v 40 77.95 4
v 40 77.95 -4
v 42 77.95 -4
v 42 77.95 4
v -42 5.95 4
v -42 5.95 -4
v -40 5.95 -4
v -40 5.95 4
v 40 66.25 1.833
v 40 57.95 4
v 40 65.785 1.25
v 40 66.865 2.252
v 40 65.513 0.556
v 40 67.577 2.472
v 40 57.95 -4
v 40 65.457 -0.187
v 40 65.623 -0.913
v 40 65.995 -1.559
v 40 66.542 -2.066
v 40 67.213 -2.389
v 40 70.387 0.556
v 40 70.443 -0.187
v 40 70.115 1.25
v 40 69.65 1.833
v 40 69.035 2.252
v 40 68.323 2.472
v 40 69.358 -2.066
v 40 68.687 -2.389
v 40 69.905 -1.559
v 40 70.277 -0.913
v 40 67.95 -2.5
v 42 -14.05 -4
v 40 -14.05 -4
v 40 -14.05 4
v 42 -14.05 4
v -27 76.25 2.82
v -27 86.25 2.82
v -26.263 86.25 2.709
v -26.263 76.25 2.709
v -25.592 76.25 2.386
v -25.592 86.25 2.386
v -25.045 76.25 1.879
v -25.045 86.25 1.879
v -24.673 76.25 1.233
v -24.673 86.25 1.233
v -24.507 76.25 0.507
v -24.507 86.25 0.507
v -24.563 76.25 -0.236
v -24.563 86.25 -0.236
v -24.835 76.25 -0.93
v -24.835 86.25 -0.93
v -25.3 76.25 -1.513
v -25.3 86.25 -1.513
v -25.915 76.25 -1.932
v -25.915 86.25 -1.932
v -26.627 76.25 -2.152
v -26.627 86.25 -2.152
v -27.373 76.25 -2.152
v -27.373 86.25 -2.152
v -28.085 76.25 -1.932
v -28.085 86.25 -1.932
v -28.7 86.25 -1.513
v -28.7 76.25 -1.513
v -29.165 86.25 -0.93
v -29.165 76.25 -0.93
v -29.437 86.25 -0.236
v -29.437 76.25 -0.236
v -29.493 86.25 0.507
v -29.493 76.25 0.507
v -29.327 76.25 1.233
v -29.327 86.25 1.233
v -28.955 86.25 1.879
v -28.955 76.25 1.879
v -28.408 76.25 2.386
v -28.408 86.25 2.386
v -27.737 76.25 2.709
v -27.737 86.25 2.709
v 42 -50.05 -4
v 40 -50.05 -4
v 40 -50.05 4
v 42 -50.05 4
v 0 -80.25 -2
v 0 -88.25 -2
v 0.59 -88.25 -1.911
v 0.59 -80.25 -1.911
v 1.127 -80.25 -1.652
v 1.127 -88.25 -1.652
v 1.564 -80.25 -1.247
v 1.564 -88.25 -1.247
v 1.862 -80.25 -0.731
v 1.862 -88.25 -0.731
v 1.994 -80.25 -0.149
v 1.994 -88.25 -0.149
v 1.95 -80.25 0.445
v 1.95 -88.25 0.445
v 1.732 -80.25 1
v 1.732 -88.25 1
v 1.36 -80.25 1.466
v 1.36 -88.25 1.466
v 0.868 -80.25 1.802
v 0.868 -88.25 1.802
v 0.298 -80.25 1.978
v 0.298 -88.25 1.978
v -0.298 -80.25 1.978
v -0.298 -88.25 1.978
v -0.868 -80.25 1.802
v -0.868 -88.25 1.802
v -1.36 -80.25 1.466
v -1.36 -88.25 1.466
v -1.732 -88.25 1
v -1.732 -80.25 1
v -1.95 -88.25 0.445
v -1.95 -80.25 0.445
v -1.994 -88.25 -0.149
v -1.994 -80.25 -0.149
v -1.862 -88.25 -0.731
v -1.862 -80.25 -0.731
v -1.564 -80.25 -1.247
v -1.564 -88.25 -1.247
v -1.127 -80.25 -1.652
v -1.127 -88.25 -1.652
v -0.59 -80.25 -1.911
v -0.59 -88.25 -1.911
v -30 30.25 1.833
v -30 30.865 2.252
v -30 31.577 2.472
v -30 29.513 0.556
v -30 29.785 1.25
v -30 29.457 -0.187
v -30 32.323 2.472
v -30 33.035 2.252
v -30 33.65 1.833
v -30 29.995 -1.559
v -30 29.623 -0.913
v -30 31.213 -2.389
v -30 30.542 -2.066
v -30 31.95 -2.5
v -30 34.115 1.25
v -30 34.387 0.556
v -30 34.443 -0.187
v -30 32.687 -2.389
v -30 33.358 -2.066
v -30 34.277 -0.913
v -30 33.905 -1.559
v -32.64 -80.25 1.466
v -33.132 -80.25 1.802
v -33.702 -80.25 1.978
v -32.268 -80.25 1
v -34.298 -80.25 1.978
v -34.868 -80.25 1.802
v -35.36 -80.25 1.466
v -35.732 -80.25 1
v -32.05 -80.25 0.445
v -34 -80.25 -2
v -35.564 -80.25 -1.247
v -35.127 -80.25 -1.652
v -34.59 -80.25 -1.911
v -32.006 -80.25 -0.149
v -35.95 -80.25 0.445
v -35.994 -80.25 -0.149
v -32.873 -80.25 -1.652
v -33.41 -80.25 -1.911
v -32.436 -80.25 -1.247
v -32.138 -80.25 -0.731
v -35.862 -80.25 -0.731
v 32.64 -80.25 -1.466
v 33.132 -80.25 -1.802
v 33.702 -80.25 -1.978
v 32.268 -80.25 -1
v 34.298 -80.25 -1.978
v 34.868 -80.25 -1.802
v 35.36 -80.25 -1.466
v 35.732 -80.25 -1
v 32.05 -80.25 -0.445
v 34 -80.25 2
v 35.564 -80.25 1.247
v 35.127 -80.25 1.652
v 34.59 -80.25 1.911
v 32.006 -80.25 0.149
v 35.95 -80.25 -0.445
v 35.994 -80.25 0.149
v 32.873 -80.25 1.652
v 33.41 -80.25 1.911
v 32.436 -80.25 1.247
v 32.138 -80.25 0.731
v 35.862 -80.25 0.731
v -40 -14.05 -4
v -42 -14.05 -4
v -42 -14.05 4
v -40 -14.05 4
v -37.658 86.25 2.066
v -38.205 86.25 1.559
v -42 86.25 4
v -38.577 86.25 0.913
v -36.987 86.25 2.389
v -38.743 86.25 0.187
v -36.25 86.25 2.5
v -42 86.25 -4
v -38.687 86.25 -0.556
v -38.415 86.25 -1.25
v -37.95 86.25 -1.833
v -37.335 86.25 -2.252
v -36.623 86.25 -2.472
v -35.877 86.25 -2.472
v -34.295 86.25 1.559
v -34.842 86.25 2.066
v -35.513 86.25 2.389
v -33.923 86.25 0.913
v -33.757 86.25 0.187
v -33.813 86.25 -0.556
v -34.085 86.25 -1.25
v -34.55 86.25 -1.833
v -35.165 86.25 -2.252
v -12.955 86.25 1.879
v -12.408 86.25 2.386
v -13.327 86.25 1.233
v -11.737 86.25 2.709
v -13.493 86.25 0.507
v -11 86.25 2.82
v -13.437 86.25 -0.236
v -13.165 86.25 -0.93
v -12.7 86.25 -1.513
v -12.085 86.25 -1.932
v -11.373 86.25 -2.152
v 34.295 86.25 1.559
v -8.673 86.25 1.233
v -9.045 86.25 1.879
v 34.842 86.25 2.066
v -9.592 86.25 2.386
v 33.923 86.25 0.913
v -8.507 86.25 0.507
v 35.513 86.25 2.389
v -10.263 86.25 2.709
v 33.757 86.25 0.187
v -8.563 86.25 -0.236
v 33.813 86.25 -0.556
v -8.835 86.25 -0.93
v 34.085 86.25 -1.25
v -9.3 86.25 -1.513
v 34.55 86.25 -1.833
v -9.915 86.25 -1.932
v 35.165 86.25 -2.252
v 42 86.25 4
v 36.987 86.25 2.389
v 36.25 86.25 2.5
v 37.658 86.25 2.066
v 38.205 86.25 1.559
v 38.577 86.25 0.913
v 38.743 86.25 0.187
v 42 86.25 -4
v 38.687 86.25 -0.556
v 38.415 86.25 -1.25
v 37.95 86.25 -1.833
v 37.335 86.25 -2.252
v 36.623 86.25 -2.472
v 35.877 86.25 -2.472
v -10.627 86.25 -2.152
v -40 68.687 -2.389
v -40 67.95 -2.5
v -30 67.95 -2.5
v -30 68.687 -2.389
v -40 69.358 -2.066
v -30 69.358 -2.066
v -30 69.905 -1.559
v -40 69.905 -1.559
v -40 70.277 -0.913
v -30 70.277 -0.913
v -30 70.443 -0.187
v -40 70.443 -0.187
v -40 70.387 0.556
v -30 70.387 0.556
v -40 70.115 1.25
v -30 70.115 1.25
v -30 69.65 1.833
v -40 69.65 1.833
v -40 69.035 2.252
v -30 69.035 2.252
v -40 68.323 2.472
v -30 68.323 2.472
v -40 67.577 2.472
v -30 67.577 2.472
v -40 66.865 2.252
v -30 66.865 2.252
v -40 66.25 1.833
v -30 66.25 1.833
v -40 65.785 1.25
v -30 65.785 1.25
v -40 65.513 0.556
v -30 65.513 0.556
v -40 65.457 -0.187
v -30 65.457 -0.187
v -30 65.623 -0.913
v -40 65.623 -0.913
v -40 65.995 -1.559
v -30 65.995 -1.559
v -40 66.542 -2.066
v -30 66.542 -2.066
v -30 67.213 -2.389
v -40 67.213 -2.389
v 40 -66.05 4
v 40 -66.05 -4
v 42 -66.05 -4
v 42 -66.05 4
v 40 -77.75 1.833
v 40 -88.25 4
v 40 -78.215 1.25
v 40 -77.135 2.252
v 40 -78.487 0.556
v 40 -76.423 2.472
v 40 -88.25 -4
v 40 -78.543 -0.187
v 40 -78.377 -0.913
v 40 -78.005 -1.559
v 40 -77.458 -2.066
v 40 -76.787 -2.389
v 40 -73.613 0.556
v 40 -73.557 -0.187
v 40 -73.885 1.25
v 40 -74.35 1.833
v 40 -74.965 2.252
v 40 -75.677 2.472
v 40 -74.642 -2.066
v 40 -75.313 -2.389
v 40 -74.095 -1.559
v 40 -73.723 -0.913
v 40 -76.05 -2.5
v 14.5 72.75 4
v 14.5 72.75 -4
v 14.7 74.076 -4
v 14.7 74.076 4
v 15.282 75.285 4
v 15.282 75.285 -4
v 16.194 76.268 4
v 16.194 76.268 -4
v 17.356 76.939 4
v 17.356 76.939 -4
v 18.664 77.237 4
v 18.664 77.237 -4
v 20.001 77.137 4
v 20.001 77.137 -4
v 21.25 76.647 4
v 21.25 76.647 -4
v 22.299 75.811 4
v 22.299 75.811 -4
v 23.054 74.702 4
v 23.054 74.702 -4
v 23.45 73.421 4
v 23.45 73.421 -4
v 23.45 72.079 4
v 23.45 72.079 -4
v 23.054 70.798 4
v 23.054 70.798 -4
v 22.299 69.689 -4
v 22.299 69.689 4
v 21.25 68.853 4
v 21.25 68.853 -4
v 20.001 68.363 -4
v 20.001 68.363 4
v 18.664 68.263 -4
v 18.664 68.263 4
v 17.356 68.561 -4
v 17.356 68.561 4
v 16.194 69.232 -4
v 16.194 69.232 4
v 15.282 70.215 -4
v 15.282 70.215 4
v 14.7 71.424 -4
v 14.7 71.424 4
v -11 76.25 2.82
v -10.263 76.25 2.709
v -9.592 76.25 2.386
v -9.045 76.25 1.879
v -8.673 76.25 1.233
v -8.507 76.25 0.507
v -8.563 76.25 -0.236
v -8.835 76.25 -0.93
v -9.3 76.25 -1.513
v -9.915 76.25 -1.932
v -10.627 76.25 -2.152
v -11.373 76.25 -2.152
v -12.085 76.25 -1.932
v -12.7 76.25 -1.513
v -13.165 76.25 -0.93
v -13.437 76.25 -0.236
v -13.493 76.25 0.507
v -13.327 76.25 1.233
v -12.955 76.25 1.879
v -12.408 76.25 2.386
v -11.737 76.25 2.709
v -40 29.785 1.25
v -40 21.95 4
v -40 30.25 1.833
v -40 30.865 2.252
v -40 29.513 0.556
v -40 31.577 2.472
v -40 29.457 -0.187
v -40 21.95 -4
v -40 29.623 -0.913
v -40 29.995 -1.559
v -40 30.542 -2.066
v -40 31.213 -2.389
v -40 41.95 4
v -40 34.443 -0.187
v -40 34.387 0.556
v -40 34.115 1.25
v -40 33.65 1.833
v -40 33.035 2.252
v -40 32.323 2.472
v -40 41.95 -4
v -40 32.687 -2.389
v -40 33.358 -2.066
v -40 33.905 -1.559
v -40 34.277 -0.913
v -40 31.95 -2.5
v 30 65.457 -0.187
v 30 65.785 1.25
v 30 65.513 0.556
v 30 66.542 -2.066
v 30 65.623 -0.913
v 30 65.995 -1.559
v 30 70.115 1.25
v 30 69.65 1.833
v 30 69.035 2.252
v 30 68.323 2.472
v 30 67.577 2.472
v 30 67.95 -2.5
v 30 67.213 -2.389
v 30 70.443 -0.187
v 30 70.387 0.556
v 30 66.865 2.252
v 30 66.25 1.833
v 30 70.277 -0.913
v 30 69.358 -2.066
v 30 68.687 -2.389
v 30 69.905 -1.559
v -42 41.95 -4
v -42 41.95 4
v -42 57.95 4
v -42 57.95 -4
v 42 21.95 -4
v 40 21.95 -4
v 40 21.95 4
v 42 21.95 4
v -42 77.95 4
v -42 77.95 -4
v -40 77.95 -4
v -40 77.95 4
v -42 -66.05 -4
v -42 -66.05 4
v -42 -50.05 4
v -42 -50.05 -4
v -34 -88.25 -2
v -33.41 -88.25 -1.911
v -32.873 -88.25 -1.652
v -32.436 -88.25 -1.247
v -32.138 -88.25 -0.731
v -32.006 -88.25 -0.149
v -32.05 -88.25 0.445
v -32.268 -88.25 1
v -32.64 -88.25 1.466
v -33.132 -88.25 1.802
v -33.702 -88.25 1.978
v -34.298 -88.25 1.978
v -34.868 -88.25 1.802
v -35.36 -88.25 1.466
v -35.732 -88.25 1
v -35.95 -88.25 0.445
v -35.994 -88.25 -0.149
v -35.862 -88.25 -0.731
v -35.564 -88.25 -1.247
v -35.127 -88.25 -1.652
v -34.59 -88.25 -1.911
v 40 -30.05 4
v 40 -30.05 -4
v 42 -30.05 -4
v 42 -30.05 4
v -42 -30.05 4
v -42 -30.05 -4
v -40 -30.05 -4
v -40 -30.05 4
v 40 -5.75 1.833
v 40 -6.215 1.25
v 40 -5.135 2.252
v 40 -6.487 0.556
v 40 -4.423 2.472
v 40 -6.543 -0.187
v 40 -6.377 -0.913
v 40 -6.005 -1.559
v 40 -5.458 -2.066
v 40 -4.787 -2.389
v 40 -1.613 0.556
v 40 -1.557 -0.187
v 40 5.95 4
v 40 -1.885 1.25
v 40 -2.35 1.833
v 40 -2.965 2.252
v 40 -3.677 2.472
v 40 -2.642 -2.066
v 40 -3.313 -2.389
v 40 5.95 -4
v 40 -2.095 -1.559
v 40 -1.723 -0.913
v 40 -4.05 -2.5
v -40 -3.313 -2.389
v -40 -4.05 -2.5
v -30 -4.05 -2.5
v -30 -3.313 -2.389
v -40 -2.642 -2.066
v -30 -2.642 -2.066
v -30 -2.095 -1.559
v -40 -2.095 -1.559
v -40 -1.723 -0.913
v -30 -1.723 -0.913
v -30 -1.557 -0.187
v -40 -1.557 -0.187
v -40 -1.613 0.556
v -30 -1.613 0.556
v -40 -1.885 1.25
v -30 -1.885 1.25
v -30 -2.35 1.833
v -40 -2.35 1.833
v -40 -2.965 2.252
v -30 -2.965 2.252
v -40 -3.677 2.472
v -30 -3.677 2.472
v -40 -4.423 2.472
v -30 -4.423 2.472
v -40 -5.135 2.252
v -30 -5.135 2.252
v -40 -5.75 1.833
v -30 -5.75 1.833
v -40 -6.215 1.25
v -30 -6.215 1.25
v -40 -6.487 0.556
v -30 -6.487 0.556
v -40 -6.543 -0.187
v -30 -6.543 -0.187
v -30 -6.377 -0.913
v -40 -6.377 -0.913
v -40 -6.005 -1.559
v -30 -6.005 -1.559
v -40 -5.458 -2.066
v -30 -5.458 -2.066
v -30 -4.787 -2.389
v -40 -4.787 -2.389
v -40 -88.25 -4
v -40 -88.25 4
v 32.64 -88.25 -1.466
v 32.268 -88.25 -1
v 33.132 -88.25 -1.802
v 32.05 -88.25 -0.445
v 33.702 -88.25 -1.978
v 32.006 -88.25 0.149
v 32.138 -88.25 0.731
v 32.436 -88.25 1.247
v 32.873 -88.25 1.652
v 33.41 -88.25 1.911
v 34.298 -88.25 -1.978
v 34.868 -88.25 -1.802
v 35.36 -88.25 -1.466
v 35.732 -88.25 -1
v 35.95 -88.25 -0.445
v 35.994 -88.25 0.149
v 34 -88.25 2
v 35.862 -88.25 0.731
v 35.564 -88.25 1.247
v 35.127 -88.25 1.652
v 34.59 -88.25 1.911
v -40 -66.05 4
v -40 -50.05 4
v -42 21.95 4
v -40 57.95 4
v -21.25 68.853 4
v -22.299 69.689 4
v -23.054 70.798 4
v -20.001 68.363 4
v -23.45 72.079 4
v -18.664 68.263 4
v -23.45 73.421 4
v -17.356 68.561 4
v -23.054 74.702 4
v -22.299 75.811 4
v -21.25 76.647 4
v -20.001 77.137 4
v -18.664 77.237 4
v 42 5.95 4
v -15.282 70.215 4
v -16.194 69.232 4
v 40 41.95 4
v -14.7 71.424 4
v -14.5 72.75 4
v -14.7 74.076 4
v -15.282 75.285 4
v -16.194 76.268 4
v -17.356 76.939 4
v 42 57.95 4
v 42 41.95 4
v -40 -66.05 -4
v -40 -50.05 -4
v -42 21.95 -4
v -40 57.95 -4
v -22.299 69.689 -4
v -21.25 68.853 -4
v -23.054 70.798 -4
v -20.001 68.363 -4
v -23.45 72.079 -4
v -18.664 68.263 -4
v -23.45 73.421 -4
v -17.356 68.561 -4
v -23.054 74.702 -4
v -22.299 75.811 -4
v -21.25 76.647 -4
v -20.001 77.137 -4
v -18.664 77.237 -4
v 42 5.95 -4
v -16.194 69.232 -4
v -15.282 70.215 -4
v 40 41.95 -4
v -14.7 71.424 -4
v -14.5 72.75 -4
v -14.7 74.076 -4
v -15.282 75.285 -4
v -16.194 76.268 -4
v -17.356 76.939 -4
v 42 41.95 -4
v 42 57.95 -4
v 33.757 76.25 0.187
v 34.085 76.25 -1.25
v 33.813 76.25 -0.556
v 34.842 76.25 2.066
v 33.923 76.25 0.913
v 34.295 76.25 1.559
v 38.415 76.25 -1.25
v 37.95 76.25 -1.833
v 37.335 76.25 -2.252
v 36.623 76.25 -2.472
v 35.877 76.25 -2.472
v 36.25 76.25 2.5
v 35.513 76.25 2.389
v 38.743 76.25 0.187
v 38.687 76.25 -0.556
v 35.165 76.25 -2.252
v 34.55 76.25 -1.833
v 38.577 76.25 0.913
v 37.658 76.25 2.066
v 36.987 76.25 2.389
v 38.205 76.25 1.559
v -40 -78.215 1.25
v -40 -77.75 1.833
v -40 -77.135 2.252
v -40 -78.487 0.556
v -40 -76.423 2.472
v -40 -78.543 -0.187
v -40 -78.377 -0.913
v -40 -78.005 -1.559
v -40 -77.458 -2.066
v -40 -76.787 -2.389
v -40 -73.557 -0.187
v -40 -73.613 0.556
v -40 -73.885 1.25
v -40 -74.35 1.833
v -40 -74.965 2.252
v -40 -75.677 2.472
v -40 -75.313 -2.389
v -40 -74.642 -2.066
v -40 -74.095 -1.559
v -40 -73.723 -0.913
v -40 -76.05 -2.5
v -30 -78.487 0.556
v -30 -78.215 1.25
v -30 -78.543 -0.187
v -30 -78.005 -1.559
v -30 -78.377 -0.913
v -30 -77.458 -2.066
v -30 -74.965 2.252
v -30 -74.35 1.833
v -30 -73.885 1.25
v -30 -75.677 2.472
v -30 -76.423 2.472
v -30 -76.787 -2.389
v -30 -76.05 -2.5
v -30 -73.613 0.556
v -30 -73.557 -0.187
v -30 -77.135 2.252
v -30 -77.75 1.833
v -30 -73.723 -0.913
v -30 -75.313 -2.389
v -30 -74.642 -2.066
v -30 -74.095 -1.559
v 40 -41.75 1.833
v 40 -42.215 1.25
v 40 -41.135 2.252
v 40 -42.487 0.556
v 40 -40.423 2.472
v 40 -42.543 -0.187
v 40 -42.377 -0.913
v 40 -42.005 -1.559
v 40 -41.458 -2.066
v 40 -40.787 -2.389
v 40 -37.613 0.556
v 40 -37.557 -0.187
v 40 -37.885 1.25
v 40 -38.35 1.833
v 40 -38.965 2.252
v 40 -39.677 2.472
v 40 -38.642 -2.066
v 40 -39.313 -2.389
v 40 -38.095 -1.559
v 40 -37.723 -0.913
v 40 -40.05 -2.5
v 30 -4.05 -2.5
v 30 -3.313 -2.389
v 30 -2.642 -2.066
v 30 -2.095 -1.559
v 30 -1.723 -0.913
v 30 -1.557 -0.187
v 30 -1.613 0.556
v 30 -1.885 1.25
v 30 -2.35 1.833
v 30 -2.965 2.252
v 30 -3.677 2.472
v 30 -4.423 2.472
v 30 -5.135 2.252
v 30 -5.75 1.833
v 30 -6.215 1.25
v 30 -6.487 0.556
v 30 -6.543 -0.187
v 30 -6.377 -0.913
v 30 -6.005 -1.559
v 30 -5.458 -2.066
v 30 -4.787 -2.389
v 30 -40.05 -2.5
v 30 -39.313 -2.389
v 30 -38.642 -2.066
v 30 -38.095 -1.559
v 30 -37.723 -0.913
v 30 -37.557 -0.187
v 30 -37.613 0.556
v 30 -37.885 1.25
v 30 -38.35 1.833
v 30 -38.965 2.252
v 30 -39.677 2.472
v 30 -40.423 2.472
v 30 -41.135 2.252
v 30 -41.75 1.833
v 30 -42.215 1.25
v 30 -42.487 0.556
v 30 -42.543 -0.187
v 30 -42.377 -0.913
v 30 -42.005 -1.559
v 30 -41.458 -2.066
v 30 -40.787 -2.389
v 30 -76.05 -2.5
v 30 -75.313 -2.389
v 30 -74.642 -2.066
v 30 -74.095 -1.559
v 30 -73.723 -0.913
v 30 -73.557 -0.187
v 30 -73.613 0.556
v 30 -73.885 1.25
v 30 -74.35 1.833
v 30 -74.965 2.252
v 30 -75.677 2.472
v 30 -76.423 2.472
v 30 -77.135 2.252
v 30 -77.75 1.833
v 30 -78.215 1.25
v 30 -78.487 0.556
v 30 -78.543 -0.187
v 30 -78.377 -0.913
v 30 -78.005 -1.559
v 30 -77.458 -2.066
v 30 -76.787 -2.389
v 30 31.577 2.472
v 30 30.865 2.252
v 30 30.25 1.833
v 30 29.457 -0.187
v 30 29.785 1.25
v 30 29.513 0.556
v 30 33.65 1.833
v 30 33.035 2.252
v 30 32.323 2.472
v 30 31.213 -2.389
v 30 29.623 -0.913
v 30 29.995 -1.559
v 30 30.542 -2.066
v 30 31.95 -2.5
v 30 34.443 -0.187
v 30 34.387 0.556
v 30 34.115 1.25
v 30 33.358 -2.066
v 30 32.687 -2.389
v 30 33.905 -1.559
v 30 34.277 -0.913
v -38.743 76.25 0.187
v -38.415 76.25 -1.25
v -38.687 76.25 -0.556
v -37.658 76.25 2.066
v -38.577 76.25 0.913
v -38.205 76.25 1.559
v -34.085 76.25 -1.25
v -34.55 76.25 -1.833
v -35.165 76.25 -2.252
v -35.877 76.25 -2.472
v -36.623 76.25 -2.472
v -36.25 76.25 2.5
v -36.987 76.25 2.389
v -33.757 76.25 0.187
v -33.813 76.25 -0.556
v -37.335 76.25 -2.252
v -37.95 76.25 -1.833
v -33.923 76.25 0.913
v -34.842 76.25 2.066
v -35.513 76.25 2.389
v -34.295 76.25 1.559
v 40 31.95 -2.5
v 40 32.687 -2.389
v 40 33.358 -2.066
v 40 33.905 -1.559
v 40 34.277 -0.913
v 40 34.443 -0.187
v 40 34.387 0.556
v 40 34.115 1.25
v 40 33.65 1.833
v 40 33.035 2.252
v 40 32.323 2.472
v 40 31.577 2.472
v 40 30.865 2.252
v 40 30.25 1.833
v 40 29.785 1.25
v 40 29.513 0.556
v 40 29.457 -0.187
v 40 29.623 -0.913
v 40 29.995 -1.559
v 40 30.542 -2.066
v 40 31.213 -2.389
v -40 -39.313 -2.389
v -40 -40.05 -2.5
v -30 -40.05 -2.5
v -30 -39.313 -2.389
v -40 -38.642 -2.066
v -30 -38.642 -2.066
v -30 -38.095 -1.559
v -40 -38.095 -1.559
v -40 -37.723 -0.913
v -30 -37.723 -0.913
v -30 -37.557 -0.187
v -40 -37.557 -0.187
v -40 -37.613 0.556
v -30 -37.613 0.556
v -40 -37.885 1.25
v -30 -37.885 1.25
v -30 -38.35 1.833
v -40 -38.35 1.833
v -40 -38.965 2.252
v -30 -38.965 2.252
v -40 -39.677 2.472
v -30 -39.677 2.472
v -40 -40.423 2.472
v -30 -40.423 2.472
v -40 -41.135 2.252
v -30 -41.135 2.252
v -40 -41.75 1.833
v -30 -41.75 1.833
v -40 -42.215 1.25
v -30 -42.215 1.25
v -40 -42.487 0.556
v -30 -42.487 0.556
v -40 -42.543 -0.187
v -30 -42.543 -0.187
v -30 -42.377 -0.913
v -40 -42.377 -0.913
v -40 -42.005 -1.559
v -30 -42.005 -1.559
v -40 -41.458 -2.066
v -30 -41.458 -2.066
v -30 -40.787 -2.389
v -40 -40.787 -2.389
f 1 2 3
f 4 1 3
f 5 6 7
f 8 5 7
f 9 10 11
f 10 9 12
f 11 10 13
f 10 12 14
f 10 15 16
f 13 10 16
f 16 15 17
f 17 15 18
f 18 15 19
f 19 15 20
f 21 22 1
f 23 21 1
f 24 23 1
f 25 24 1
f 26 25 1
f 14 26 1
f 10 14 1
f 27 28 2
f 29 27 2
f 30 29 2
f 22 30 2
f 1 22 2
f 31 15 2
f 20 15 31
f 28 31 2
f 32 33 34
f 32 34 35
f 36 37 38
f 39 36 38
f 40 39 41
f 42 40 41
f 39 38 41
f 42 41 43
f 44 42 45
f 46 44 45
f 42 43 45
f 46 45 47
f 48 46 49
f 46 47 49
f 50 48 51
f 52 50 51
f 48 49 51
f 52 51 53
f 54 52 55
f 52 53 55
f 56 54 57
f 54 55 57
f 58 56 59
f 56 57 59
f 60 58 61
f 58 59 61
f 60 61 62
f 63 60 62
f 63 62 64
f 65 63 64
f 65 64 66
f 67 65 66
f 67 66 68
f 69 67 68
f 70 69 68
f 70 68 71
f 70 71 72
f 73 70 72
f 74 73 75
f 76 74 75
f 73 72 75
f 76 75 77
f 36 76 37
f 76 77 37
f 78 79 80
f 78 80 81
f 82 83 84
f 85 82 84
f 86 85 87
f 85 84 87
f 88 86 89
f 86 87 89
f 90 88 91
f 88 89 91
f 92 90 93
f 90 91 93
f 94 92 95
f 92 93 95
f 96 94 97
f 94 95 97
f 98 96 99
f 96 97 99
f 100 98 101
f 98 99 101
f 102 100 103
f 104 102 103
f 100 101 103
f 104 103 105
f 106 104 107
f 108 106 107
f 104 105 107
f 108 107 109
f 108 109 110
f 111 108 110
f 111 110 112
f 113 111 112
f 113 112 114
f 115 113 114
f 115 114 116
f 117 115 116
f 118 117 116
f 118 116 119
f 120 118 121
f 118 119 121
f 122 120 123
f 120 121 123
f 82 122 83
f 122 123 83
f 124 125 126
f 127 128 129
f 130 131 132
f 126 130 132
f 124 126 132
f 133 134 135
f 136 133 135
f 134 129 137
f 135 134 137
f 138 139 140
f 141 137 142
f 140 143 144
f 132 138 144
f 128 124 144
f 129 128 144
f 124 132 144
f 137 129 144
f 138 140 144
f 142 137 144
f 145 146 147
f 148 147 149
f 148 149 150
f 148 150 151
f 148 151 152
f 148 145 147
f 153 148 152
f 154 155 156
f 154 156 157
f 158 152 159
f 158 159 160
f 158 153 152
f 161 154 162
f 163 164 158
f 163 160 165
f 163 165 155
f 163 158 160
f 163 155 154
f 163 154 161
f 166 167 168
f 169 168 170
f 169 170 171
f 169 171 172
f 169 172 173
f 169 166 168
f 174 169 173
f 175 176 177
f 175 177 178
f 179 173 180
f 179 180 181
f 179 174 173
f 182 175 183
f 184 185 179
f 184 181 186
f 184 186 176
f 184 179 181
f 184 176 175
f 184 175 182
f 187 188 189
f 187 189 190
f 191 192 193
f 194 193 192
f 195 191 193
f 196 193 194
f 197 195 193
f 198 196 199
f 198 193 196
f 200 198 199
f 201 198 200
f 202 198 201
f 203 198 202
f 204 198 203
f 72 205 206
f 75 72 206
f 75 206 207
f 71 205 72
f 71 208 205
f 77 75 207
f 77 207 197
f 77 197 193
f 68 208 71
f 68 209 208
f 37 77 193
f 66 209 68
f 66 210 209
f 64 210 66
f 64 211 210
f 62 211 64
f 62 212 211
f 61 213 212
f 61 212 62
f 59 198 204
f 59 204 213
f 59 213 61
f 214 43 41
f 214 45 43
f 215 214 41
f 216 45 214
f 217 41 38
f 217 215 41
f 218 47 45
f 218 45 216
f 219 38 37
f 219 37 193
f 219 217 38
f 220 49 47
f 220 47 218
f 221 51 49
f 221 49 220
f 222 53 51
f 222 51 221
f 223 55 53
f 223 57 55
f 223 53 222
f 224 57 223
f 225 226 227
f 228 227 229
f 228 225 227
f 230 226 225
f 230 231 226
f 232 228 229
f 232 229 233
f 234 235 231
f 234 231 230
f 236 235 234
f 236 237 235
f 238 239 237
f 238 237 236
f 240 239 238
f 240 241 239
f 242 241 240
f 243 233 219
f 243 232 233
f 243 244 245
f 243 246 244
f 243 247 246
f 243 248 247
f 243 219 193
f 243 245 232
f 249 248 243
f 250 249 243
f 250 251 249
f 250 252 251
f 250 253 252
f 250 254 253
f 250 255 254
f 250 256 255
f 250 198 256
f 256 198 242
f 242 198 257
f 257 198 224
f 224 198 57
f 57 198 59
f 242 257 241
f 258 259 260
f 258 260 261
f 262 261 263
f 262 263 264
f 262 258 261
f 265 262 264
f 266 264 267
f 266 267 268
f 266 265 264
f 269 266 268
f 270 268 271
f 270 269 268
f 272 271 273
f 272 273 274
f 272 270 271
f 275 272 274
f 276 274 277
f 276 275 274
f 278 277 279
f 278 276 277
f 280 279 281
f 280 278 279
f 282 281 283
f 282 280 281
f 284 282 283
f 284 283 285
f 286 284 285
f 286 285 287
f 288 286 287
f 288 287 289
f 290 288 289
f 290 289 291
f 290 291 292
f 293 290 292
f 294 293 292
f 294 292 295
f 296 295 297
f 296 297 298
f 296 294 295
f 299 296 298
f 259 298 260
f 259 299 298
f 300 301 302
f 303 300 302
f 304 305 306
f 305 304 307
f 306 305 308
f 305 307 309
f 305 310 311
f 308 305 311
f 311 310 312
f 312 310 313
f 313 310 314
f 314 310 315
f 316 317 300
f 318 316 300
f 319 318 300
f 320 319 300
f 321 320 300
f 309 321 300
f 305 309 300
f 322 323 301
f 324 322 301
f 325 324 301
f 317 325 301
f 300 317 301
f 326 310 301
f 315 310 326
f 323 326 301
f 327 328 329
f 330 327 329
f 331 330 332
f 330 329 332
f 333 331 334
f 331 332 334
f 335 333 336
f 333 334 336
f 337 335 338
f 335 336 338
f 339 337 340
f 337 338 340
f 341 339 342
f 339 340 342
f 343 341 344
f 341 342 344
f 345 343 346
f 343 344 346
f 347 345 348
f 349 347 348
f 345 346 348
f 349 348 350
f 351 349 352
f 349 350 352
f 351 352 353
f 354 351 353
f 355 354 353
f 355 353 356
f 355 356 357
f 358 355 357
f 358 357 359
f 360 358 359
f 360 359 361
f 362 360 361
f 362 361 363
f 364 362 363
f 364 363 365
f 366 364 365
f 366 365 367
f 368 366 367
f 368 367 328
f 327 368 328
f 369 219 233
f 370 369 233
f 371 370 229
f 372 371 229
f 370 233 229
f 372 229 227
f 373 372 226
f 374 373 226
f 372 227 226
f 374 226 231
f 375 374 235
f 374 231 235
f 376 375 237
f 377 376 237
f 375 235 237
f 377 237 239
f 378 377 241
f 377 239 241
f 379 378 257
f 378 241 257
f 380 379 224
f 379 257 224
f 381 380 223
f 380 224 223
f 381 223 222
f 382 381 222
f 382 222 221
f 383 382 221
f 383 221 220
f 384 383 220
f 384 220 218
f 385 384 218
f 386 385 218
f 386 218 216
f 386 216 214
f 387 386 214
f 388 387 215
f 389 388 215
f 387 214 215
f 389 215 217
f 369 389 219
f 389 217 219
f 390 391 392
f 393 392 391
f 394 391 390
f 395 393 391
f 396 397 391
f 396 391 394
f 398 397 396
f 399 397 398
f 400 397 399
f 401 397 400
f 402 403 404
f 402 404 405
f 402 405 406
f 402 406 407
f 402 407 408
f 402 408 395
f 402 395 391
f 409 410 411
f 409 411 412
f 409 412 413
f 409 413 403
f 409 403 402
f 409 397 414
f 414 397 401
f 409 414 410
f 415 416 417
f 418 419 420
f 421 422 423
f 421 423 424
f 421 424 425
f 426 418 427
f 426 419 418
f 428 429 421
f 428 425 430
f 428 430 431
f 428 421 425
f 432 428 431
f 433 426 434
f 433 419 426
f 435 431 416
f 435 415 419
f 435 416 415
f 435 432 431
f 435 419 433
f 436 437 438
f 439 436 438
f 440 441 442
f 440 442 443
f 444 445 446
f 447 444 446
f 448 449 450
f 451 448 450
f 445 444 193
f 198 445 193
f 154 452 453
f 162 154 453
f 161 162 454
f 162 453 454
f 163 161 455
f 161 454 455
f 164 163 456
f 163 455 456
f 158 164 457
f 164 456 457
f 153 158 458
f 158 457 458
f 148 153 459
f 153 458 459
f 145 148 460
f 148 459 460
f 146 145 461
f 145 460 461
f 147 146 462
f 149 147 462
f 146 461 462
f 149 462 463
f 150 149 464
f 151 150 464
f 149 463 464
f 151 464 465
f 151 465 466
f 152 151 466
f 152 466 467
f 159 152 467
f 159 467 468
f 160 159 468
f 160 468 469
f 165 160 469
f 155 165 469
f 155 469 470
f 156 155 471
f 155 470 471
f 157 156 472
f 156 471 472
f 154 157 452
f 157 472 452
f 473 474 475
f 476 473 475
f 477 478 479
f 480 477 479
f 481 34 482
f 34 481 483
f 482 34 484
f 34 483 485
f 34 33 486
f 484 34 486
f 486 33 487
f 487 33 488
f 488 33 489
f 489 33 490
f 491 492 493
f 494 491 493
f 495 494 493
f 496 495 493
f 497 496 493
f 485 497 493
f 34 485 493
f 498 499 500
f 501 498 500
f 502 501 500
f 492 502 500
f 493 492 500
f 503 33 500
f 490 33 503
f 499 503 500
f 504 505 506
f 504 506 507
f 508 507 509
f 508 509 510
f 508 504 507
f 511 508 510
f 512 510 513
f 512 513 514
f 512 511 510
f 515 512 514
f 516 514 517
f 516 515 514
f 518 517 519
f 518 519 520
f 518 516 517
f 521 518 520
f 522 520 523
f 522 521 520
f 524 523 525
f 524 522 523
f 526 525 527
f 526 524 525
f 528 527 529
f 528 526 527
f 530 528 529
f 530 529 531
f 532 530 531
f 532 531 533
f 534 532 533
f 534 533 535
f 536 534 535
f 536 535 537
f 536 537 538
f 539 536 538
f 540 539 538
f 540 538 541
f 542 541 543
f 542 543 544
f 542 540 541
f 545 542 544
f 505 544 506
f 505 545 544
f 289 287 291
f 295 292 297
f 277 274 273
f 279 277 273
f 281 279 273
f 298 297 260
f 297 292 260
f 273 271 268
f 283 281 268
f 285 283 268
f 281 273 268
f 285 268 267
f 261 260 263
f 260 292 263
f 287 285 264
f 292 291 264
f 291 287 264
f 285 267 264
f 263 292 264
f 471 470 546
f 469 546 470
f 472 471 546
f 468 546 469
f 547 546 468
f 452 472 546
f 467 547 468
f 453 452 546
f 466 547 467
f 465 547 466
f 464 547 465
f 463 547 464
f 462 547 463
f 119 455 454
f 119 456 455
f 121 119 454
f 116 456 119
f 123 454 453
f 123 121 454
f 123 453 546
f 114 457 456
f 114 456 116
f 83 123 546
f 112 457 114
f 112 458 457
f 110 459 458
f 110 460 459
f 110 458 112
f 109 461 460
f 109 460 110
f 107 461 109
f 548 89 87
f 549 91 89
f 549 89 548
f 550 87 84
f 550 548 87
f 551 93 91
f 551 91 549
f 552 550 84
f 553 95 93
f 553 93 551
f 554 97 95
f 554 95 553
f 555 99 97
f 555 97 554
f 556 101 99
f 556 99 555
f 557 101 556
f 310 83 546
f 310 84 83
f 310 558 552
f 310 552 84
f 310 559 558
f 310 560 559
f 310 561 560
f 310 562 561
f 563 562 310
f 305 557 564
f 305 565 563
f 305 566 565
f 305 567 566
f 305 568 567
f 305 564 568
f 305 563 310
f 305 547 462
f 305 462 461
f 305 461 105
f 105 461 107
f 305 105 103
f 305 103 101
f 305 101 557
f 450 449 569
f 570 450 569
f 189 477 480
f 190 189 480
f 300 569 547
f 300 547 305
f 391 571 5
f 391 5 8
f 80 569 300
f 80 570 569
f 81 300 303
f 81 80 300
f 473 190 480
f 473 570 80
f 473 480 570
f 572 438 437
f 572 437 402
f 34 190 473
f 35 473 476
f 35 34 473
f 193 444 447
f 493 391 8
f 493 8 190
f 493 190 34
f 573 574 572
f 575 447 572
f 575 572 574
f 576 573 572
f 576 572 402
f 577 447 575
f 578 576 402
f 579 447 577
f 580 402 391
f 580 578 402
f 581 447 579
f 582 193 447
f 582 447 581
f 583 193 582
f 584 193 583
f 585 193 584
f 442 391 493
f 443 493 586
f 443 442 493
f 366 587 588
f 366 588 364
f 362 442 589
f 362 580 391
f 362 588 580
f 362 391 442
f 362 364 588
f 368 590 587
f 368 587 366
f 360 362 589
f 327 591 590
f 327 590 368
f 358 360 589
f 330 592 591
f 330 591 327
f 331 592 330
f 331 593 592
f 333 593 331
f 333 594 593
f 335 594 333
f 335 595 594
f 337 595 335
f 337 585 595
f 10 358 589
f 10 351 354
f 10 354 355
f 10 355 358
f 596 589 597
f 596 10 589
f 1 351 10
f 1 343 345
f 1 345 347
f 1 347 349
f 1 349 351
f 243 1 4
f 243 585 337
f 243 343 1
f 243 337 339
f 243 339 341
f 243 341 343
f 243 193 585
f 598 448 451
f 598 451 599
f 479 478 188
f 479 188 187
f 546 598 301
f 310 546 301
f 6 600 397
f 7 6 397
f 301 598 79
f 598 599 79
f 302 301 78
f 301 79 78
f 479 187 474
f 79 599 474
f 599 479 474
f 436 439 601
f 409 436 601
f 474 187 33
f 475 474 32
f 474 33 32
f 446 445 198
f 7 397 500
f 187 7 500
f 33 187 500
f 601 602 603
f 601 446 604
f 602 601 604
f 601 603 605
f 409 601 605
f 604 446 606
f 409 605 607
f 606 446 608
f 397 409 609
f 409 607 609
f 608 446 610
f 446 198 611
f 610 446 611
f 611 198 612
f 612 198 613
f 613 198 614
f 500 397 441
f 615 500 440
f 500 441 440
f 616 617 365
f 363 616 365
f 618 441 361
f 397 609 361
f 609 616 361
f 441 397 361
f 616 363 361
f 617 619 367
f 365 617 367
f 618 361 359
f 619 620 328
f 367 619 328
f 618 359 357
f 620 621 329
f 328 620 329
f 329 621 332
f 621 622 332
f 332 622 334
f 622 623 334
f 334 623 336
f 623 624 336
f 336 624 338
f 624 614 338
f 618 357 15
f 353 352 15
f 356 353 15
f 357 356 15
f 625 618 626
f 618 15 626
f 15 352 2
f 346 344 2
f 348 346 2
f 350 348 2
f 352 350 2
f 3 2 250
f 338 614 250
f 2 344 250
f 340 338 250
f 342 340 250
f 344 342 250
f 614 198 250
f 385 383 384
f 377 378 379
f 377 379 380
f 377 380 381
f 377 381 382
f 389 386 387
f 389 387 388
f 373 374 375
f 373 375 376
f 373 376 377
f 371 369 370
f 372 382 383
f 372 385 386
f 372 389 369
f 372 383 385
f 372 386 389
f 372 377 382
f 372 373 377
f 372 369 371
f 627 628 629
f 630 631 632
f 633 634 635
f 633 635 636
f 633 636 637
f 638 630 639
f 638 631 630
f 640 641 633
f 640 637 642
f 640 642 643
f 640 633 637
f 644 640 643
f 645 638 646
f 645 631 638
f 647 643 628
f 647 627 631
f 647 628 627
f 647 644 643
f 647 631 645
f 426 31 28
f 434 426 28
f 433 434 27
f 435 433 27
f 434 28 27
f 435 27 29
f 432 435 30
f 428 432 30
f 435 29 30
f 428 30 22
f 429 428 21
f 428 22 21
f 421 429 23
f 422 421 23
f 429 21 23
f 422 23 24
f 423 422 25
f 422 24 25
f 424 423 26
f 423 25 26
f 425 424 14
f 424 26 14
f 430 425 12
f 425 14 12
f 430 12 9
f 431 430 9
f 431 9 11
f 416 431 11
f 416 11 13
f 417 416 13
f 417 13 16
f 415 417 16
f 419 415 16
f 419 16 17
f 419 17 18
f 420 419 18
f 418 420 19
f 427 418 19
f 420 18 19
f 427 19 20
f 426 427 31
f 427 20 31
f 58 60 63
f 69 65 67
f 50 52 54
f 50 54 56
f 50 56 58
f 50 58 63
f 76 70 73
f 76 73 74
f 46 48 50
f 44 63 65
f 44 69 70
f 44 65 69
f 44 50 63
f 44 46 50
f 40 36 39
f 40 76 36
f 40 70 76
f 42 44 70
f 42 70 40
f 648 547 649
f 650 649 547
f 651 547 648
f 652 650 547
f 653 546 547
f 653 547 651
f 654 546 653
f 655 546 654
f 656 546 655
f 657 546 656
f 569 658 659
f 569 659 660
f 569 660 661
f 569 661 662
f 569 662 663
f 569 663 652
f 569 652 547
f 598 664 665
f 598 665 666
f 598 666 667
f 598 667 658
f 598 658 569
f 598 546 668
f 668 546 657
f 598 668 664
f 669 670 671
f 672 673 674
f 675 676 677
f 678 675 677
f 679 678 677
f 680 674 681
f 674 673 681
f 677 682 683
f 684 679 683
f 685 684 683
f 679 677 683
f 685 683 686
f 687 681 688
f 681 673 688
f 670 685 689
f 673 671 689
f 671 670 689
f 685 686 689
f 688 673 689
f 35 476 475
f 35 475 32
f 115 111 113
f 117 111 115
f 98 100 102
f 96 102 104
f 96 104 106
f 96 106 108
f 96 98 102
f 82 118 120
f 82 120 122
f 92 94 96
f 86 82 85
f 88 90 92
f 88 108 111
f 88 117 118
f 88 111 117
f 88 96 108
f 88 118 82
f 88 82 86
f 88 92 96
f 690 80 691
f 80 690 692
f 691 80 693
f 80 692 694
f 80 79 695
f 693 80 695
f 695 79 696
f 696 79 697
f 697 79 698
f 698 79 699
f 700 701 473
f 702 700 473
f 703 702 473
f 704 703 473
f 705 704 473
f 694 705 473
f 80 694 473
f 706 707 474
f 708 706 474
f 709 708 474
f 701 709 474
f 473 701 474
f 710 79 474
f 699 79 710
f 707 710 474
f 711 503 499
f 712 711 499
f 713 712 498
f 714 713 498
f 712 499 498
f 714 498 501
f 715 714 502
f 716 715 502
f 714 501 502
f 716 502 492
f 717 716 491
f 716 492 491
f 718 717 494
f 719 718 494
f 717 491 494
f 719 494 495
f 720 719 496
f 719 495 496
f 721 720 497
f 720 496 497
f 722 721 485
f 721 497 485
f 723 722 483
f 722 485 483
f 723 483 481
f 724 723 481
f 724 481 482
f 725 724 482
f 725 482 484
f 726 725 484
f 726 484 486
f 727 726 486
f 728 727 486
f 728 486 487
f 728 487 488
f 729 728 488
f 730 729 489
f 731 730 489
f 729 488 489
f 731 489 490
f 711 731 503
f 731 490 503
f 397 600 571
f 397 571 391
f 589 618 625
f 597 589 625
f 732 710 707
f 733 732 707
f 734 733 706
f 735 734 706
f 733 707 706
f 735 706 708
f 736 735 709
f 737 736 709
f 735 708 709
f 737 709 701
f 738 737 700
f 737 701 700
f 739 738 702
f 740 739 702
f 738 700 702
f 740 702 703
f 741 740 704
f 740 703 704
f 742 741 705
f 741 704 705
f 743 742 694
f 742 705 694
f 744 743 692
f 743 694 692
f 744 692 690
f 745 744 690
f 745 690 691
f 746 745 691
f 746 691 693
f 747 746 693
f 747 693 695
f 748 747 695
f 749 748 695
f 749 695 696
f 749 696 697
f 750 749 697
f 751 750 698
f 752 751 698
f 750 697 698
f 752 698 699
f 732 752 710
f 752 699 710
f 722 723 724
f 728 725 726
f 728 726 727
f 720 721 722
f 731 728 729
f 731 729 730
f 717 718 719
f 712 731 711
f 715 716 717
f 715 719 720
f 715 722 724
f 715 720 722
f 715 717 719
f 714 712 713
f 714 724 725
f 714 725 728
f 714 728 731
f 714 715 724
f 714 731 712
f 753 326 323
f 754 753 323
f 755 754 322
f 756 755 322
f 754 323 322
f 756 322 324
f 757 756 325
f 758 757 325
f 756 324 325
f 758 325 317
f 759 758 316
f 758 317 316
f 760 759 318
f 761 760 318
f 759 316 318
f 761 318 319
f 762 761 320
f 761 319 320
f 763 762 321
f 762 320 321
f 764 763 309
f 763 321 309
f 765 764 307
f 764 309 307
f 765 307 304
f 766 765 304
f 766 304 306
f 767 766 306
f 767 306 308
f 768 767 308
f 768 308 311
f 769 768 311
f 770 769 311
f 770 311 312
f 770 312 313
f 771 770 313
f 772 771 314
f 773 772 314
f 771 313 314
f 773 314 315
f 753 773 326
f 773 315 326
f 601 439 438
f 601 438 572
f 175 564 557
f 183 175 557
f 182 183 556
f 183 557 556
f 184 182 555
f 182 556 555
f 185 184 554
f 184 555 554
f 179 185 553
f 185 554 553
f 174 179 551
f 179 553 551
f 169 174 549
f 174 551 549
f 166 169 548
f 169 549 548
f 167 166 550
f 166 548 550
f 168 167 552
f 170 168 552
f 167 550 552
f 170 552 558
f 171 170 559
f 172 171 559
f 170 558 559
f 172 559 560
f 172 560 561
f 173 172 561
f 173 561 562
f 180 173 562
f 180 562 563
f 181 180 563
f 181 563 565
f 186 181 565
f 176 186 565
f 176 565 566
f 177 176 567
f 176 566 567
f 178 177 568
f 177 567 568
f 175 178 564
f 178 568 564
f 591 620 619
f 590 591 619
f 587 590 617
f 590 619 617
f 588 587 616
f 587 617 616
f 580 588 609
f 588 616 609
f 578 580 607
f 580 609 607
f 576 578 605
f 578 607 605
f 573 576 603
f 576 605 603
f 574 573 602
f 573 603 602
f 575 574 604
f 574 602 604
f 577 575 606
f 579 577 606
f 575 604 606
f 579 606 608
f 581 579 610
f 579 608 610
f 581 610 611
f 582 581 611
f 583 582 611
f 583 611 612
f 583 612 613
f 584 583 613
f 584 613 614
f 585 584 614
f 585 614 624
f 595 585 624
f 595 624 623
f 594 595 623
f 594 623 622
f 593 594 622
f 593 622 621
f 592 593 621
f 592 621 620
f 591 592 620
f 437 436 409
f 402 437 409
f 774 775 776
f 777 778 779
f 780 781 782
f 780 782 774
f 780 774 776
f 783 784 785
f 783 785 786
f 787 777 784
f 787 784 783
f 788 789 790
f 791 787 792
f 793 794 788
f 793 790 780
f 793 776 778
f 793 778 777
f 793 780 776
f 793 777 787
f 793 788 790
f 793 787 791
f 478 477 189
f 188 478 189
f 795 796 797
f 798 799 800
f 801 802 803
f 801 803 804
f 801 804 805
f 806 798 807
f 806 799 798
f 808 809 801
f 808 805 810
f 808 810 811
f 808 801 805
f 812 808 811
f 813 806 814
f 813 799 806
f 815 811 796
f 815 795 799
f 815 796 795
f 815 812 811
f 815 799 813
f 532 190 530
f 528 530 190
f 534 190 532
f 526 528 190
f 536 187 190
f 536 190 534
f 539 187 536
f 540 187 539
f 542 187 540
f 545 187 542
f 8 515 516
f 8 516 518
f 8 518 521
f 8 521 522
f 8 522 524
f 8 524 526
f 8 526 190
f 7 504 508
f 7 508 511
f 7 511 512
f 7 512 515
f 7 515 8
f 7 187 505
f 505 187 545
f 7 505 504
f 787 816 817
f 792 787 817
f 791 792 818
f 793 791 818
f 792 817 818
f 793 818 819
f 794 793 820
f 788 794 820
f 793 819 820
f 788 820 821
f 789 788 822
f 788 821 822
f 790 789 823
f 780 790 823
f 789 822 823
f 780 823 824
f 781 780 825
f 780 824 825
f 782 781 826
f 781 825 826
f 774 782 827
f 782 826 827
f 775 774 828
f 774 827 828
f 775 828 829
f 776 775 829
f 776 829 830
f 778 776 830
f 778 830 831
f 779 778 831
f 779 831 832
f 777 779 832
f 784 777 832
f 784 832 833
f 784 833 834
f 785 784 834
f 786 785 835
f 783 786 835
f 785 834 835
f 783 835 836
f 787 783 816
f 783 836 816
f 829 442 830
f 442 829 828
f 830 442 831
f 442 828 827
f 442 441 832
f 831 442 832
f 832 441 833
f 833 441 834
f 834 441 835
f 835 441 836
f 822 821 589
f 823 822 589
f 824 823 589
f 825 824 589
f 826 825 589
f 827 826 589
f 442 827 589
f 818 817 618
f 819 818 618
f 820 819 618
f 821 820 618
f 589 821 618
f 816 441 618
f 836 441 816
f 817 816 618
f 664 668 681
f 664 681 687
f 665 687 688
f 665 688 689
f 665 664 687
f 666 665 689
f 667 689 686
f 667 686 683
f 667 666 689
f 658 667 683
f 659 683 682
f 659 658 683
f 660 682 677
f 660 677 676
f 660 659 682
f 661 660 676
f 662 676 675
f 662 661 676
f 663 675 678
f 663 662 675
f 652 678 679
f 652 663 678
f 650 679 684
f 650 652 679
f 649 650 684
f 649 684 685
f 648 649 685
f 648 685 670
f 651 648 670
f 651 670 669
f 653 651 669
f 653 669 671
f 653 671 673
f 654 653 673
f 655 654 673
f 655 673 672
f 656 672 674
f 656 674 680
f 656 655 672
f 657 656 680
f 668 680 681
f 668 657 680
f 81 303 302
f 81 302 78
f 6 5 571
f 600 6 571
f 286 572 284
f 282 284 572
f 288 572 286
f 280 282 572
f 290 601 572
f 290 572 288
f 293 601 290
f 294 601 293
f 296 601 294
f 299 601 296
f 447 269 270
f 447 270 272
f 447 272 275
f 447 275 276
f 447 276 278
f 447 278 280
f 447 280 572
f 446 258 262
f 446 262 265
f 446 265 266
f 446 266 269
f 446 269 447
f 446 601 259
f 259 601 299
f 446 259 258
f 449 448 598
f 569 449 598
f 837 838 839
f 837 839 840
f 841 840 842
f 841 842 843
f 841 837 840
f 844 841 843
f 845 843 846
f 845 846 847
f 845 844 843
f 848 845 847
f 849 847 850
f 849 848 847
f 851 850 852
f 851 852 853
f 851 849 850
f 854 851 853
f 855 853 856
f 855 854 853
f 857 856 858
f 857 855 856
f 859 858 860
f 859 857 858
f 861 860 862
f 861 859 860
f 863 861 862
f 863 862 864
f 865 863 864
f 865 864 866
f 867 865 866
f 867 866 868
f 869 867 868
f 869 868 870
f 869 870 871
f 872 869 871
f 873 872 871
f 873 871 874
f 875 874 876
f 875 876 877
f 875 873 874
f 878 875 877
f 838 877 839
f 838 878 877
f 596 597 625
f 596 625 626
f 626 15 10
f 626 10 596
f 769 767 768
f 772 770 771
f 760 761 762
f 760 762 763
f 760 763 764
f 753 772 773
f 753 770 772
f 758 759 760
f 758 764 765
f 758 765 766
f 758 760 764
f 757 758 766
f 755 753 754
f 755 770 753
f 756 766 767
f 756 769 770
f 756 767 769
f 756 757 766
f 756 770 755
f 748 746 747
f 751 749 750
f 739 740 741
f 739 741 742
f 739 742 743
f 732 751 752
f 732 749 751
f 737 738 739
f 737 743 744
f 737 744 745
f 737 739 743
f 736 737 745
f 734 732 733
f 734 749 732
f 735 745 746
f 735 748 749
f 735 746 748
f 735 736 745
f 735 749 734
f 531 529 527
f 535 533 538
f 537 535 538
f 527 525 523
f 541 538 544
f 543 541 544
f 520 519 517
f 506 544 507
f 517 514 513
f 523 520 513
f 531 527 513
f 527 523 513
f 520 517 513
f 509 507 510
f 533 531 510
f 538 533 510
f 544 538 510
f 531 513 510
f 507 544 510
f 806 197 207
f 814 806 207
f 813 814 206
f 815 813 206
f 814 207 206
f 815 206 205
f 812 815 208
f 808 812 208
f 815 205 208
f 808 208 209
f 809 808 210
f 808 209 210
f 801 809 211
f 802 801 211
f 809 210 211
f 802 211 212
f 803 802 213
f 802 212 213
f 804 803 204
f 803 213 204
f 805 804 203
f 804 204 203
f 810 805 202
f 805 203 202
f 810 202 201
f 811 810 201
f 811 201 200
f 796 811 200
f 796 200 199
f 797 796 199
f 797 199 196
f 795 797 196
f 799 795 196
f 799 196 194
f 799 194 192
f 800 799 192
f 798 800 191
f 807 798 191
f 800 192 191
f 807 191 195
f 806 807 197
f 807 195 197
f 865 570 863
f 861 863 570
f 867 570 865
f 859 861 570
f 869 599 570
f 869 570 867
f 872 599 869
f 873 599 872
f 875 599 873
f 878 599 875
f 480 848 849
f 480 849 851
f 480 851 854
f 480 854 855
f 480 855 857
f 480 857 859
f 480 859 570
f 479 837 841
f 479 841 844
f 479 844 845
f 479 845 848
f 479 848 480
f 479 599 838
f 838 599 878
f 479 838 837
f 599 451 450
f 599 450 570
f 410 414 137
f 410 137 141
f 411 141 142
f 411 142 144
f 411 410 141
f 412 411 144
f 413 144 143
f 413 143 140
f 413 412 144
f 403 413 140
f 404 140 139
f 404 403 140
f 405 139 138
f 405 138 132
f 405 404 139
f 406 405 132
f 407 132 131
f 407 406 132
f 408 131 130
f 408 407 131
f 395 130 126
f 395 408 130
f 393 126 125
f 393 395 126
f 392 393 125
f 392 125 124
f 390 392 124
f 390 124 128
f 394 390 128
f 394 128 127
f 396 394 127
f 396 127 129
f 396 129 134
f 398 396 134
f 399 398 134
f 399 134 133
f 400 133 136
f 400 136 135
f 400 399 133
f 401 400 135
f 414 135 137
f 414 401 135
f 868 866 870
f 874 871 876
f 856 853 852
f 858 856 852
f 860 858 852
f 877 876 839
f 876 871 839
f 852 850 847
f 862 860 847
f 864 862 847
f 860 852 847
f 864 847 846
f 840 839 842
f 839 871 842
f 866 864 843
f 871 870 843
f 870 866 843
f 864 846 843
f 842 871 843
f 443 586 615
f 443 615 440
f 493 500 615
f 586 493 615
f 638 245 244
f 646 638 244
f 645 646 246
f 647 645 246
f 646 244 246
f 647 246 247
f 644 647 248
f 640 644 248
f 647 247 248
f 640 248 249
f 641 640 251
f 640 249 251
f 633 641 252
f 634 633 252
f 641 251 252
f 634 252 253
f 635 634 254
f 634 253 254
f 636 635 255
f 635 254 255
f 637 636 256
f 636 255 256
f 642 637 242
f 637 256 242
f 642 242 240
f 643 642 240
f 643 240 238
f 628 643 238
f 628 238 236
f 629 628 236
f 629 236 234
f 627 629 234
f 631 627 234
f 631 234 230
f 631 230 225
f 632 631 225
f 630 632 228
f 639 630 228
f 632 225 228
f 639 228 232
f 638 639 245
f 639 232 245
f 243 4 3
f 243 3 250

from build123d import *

# Parameters (mm, degrees)
SKETCH_1_W              = 84
SKETCH_1_H              = 176.5
EXTRUDE_1_DEPTH         = 4
CUT_EXTRUDE1_DEPTH      = 99.061524055
CUT_EXTRUDE1_DEPTH_BACK = 99.061524055
SKETCH2_W               = 2
SKETCH2_H               = 20
SKETCH2_H_2             = 22.2
SKETCH2_W_2             = 86
SKETCH2_H_3             = 2
SKETCH3_R               = 2.5
CUT_EXTRUDE2_DEPTH      = 10
SKETCH4_R               = 2
CUT_EXTRUDE3_DEPTH      = 8
SKETCH5_R               = 2.5
CUT_EXTRUDE4_DEPTH      = 10
SKETCH6_R               = 4.5
CUT_EXTRUDE5_DEPTH      = 99.061524055
SKETCH7_R               = 2.5
CUT_EXTRUDE6_DEPTH      = 10


with BuildPart() as part:
    # 草图1 → 凸台-拉伸1 (new, symmetric)
    with BuildSketch(Plane.XY):
        Rectangle(SKETCH_1_W, SKETCH_1_H)
    extrude(amount=EXTRUDE_1_DEPTH, both=True)

    # Sketch2 → Cut-Extrude1 (cut, two sides: drawn at the far end of the back side and taken through both)
    with BuildSketch(Plane.XY.offset(4).offset(-CUT_EXTRUDE1_DEPTH_BACK)):
        with Locations((-41, 67.95)):
            Rectangle(SKETCH2_W, SKETCH2_H)
        with Locations((-41, 31.95)):
            Rectangle(SKETCH2_W, SKETCH2_H)
        with Locations((-41, -4.05)):
            Rectangle(SKETCH2_W, SKETCH2_H)
        with Locations((-41, -40.05)):
            Rectangle(SKETCH2_W, SKETCH2_H)
        with Locations((-41, -77.15)):
            Rectangle(SKETCH2_W, SKETCH2_H_2)
        with Locations((41, -77.15)):
            Rectangle(SKETCH2_W, SKETCH2_H_2)
        with Locations((41, -40.05)):
            Rectangle(SKETCH2_W, SKETCH2_H)
        with Locations((41, -4.05)):
            Rectangle(SKETCH2_W, SKETCH2_H)
        with Locations((41, 31.95)):
            Rectangle(SKETCH2_W, SKETCH2_H)
        with Locations((41, 67.95)):
            Rectangle(SKETCH2_W, SKETCH2_H)
        with Locations((0, 87.25)):
            Rectangle(SKETCH2_W_2, SKETCH2_H_3)
    extrude(amount=CUT_EXTRUDE1_DEPTH + CUT_EXTRUDE1_DEPTH_BACK, mode=Mode.SUBTRACT)

    # Sketch3 → Cut-Extrude2 (cut)
    with BuildSketch(Plane(origin=(40, 0, 0), x_dir=(0, 0, -1), z_dir=(1, 0, 0))):
        with Locations((0, 67.95)):
            Circle(SKETCH3_R)
        with Locations((0, 31.95)):
            Circle(SKETCH3_R)
        with Locations((0, -4.05)):
            Circle(SKETCH3_R)
        with Locations((0, -40.05)):
            Circle(SKETCH3_R)
        with Locations((0, -76.05)):
            Circle(SKETCH3_R)
    cut_extrude2 = extrude(amount=-CUT_EXTRUDE2_DEPTH, mode=Mode.SUBTRACT)

    # Mirror1: Cut-Extrude2 across plane
    add(cut_extrude2.mirror(Plane(origin=(0, 0, 0), x_dir=(0, 0, 1), z_dir=(1, 0, 0))), mode=Mode.SUBTRACT)

    # Sketch4 → Cut-Extrude3 (cut)
    with BuildSketch(Plane.XZ.offset(88.25)):
        with Locations(Location((-34, 0, 0), (0, 0, 270))):
            Circle(SKETCH4_R)
        with Locations(Location((34, 0, 0), (0, 0, 90))):
            Circle(SKETCH4_R)
        with Locations(Location((0, 0, 0), (0, 0, 270))):
            Circle(SKETCH4_R)
    extrude(amount=-CUT_EXTRUDE3_DEPTH, mode=Mode.SUBTRACT)

    # Sketch5 → Cut-Extrude4 (cut)
    with BuildSketch(Plane(origin=(0, 86.25, 0), x_dir=(1, 0, 0), z_dir=(0, 1, 0))):
        with Locations(Location((-36.25, 0, 0), (0, 0, 270))):
            Circle(SKETCH5_R)
        with Locations(Location((36.25, 0, 0), (0, 0, 270))):
            Circle(SKETCH5_R)
    extrude(amount=-CUT_EXTRUDE4_DEPTH, mode=Mode.SUBTRACT)

    # Sketch6 → Cut-Extrude5 (cut, through all)
    with BuildSketch(Plane(origin=(0, 0, -4), x_dir=(-1, 0, 0), z_dir=(0, 0, -1))):
        with Locations((-19, 72.75)):
            Circle(SKETCH6_R)
        with Locations(Location((19, 72.75, 0), (0, 0, 180))):
            Circle(SKETCH6_R)
    extrude(amount=-CUT_EXTRUDE5_DEPTH, mode=Mode.SUBTRACT)

    # Sketch7 → Cut-Extrude6 (cut)
    with BuildSketch(Plane(origin=(0, 86.25, 0), x_dir=(1, 0, 0), z_dir=(0, 1, 0))):
        with Locations(Location((-11, -0.32, 0), (0, 0, 270))):
            Circle(SKETCH7_R)
        with Locations(Location((-27, -0.32, 0), (0, 0, 270))):
            Circle(SKETCH7_R)
    extrude(amount=-CUT_EXTRUDE6_DEPTH, mode=Mode.SUBTRACT)


solid = part.part
